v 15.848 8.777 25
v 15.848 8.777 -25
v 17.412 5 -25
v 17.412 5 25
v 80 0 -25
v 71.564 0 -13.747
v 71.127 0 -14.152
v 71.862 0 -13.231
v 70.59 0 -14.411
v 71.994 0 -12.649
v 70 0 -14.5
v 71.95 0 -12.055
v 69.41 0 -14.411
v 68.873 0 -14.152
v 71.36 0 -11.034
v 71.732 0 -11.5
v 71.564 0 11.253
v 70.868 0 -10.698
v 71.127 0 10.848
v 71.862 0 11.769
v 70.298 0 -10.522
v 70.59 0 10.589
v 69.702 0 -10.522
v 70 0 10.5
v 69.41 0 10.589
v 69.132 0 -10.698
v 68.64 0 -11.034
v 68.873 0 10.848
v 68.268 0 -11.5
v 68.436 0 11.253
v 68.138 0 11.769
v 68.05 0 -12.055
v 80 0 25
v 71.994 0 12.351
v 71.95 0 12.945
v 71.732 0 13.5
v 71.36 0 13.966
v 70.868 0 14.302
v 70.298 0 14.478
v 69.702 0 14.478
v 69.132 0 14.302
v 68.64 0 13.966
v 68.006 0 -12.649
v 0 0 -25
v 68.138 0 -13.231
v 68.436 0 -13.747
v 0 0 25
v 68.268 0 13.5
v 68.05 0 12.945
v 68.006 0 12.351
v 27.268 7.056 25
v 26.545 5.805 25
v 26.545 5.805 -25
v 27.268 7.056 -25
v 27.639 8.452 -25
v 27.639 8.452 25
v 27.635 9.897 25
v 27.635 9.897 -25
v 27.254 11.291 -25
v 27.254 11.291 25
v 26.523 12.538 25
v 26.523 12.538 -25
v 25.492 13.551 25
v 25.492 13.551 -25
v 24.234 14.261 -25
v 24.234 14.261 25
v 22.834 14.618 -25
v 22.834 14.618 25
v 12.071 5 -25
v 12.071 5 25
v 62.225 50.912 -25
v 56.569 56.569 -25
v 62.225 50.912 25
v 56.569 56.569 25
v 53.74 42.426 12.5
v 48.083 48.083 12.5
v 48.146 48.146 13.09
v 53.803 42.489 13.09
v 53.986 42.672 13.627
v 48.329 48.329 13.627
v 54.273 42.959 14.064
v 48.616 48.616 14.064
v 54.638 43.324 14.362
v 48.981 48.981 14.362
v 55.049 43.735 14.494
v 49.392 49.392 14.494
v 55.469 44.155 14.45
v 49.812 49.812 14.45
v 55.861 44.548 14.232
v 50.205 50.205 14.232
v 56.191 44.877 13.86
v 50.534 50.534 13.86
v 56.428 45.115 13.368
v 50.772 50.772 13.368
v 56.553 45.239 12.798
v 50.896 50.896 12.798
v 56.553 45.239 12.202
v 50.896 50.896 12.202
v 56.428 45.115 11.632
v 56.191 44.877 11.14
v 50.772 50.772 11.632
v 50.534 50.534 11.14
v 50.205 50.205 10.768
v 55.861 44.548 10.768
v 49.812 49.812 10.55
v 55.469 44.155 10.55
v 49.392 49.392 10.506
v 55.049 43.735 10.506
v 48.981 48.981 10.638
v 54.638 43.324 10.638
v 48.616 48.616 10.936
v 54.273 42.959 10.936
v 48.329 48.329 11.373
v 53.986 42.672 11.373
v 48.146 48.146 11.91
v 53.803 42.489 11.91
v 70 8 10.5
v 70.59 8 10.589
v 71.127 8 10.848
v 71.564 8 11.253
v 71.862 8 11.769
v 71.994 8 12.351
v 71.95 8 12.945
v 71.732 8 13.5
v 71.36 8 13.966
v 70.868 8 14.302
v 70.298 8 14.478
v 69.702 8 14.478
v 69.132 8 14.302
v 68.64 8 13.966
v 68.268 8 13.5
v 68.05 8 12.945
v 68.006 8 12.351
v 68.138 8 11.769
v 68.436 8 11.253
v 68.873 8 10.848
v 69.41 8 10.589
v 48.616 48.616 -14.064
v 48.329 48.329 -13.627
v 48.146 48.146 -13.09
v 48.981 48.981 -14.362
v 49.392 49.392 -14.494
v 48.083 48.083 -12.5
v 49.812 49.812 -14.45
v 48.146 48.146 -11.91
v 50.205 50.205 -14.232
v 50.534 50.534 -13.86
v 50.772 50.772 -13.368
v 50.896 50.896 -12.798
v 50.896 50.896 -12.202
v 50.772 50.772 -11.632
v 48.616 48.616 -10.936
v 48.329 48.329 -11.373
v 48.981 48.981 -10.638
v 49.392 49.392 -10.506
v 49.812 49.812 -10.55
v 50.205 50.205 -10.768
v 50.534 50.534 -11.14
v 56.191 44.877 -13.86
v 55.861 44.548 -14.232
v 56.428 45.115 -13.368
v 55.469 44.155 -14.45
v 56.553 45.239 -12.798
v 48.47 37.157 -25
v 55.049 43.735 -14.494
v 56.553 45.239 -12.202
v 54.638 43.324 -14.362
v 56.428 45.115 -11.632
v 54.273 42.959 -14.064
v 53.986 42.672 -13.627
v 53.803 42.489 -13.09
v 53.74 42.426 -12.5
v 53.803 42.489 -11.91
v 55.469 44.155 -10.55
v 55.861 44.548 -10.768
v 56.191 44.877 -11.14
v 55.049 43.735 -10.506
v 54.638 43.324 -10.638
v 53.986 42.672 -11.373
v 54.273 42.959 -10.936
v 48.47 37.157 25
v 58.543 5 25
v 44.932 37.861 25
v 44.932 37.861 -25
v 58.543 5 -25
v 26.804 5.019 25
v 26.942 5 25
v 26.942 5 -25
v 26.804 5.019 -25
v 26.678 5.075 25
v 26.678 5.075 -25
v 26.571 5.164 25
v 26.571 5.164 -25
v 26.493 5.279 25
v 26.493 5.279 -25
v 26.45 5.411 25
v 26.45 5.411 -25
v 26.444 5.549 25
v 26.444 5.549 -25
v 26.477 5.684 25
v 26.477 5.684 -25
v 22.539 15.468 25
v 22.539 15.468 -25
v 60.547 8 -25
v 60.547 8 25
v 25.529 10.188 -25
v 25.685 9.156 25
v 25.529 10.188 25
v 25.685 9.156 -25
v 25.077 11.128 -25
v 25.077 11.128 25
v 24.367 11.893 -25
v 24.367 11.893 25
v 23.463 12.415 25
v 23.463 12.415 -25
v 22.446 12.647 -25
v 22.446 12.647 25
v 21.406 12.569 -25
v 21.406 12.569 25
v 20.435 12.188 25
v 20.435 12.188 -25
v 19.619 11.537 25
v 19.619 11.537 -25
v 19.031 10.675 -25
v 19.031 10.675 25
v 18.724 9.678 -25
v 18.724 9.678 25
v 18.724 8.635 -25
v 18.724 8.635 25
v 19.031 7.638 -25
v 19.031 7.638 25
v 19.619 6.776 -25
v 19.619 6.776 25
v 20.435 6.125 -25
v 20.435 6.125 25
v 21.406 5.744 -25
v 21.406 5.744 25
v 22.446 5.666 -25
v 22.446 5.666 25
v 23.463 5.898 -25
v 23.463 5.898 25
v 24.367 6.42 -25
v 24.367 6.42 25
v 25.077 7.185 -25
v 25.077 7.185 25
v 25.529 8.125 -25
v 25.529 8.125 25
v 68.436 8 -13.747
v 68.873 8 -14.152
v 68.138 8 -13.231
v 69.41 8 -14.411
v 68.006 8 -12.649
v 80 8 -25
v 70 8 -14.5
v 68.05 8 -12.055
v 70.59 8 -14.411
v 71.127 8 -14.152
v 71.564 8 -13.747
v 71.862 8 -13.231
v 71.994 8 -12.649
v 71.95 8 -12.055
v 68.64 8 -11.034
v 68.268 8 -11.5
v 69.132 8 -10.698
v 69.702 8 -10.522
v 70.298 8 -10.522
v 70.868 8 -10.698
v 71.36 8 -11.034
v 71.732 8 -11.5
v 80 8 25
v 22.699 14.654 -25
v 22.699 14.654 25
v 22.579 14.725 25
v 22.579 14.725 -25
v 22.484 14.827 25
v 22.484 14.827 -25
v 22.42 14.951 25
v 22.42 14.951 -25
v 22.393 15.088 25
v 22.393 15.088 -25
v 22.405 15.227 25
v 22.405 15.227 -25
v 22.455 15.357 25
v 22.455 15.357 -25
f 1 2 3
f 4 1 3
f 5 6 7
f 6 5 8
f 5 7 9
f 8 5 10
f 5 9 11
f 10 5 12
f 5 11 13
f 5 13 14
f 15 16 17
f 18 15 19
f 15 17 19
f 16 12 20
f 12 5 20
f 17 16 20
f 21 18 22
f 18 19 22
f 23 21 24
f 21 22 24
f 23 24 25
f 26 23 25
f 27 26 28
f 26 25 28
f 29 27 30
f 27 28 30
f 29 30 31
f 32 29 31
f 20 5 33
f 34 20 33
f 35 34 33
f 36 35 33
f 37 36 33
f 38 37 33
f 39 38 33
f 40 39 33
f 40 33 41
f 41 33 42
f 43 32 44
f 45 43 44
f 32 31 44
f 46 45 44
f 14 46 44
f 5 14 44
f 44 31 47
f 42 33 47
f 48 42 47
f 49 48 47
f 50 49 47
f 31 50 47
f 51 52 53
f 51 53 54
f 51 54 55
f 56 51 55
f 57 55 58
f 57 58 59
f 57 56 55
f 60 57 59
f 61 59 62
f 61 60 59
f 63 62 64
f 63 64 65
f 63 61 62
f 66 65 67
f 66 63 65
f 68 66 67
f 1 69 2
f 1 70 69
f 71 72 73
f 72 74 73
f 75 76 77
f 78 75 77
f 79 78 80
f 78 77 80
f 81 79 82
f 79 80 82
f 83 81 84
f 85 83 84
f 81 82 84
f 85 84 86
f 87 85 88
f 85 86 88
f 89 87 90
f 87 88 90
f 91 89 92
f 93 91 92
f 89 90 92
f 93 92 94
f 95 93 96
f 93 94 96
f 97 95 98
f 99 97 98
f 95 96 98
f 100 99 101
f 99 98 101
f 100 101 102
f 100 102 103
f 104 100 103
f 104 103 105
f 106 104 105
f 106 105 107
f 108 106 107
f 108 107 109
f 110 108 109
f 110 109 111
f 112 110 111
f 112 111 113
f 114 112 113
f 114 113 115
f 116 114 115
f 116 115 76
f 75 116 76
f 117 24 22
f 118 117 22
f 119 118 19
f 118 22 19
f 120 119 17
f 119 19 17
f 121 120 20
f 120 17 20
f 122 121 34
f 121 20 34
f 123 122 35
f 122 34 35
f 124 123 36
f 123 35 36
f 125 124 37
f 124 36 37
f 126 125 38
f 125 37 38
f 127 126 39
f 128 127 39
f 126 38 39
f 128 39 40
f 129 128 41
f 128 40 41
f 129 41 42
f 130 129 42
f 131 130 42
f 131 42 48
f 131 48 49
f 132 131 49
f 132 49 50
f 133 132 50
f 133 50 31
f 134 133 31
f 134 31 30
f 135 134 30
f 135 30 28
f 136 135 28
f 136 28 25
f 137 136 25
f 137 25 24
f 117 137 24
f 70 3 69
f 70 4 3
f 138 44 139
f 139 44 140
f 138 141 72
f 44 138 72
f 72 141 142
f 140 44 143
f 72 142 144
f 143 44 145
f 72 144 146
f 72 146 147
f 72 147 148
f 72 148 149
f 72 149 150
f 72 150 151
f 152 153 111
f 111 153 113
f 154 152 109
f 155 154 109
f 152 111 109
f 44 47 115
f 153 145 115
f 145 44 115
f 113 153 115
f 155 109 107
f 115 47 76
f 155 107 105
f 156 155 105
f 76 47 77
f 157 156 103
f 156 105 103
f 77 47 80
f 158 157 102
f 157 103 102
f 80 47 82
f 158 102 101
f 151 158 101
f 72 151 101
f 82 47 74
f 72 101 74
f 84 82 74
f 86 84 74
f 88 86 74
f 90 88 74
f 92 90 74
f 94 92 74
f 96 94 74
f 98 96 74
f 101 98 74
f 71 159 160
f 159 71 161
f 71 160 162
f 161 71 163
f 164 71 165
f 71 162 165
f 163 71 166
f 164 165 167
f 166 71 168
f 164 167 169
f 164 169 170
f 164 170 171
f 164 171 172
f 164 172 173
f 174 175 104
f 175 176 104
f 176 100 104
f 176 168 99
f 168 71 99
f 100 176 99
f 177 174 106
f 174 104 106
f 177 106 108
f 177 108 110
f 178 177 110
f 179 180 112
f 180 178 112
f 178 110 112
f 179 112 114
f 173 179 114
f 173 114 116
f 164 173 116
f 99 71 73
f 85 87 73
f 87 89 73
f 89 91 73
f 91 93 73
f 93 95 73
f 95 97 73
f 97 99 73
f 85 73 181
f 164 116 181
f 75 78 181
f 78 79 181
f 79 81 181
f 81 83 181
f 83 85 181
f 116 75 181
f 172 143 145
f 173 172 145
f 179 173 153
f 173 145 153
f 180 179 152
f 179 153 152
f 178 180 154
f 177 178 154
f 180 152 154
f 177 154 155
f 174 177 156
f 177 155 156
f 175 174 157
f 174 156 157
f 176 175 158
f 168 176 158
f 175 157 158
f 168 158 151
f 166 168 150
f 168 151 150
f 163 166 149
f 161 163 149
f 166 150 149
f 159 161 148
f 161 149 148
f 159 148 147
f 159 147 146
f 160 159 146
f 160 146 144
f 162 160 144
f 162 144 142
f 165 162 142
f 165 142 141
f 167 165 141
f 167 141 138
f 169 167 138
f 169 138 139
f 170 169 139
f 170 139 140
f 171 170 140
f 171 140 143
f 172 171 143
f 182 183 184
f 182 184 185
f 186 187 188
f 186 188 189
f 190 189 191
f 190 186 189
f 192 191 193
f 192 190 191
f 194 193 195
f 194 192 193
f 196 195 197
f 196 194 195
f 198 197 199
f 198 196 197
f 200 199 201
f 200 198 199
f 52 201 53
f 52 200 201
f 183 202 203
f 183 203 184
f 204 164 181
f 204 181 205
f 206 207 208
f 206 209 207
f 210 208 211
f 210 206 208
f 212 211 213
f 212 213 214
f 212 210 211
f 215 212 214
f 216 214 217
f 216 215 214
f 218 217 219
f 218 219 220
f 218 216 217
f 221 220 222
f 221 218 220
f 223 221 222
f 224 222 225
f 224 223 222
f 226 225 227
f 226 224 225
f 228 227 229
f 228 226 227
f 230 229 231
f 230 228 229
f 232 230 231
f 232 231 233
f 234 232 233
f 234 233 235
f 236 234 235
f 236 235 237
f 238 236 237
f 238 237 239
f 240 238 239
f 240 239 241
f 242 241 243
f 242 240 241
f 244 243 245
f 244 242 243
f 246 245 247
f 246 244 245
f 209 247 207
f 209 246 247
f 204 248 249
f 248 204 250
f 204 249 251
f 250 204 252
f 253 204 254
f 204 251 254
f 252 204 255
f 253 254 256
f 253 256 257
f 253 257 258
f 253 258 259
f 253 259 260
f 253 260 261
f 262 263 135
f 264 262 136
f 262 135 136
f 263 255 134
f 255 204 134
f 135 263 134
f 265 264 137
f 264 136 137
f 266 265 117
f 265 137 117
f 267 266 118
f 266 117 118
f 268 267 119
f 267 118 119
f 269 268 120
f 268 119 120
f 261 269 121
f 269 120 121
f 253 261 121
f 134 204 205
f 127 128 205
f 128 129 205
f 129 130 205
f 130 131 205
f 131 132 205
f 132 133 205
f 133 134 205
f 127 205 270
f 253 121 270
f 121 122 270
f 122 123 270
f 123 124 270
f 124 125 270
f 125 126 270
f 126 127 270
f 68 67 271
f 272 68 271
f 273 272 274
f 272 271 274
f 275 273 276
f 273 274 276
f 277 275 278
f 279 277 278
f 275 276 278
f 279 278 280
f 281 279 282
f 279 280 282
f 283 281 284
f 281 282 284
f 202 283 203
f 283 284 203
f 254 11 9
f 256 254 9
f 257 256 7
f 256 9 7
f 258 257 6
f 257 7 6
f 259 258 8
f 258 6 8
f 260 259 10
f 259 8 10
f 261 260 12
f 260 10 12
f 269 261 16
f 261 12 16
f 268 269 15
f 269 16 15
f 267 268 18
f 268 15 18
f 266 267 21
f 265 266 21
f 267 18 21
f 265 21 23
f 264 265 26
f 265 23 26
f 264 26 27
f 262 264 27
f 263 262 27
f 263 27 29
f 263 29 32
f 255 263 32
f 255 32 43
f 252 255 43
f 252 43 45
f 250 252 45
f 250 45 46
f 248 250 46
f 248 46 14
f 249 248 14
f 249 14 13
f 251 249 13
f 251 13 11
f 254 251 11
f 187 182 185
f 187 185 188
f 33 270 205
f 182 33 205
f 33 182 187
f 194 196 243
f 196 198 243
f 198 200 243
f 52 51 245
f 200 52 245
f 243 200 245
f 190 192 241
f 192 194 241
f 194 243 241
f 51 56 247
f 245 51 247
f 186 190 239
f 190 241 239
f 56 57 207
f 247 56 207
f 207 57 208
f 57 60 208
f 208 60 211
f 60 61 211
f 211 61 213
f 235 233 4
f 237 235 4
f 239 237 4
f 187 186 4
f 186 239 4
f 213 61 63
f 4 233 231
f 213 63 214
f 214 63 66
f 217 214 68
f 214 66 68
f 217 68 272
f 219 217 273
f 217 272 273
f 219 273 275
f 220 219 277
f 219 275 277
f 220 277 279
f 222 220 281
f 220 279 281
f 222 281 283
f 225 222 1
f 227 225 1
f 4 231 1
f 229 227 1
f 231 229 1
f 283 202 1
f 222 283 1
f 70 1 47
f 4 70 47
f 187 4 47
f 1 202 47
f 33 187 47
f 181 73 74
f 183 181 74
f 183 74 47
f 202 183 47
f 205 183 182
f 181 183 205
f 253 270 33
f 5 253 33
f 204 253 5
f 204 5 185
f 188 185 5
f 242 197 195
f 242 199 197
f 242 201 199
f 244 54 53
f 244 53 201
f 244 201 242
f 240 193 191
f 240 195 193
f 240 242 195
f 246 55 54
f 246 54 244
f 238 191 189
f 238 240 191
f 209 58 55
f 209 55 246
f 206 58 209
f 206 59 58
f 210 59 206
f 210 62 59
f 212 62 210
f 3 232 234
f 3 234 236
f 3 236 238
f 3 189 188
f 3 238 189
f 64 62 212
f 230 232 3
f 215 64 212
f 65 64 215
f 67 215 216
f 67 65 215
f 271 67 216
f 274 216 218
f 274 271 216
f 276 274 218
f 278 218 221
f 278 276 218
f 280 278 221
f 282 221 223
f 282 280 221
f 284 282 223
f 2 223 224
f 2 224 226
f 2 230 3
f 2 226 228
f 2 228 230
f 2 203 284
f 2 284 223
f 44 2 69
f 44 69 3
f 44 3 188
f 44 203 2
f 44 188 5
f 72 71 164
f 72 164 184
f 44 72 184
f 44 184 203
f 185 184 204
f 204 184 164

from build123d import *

# Parameters (mm, degrees)
SKETCH_1_R          = 3.5
EXTRUDE_1_DEPTH     = 25
SKETCH_2_R          = 2
CUT_EXTRUDE_1_DEPTH = 20
SKETCH_3_R          = 2
CUT_EXTRUDE_2_DEPTH = 20


with BuildPart() as part:
    # 草图1 → 凸台-拉伸1 (new, symmetric)
    with BuildSketch(Plane.XY):
        Polygon((0, 0), (56.568542495, 56.568542495), (62.225396744, 50.911688245), (48.470353518, 37.156645019), (60.547431318, 8), (80, 8), (80, 0), align=None)
        with Locations((22.184677187, 9.156473773)):
            Circle(SKETCH_1_R, mode=Mode.SUBTRACT)
        Polygon((12.071067812, 5), (15.847671377, 8.776603565), (17.411991793, 5), align=None, mode=Mode.SUBTRACT)
        with BuildLine():
            Line((22.539170943, 15.468103131), (44.931612237, 37.860544425))
            Line((44.931612237, 37.860544425), (58.542895405, 5))
            Line((58.542895405, 5), (26.941798117, 5))
            ThreePointArc((26.941798117, 5), (26.493271042, 5.27903968), (26.545371373, 5.804706148))
            ThreePointArc((26.545371373, 5.804706148), (27.253512915, 11.291164467), (22.833720405, 14.61804341))
            ThreePointArc((22.833720405, 14.61804341), (22.420282519, 14.950846558), (22.539170943, 15.468103131))
        make_face(mode=Mode.SUBTRACT)
    extrude(amount=EXTRUDE_1_DEPTH, both=True)

    # 草图2 → 切除-拉伸1 (cut)
    with BuildSketch(Plane(origin=(0, 0, 0), x_dir=(0, 0, 1), z_dir=(-0.7071067811865488, 0.7071067811865464, 0))):
        with Locations(Location((-12.5, 70, 0), (0, 0, 270))):
            Circle(SKETCH_2_R)
        with Locations(Location((12.5, 70, 0), (0, 0, 270))):
            Circle(SKETCH_2_R)
    extrude(amount=-CUT_EXTRUDE_1_DEPTH, mode=Mode.SUBTRACT)

    # 草图3 → 切除-拉伸2 (cut)
    with BuildSketch(Plane.XZ):
        with Locations(Location((70, 12.5, 0), (0, 0, 270))):
            Circle(SKETCH_3_R)
        with Locations(Location((70, -12.5, 0), (0, 0, 270))):
            Circle(SKETCH_3_R)
    extrude(amount=-CUT_EXTRUDE_2_DEPTH, mode=Mode.SUBTRACT)


solid = part.part
